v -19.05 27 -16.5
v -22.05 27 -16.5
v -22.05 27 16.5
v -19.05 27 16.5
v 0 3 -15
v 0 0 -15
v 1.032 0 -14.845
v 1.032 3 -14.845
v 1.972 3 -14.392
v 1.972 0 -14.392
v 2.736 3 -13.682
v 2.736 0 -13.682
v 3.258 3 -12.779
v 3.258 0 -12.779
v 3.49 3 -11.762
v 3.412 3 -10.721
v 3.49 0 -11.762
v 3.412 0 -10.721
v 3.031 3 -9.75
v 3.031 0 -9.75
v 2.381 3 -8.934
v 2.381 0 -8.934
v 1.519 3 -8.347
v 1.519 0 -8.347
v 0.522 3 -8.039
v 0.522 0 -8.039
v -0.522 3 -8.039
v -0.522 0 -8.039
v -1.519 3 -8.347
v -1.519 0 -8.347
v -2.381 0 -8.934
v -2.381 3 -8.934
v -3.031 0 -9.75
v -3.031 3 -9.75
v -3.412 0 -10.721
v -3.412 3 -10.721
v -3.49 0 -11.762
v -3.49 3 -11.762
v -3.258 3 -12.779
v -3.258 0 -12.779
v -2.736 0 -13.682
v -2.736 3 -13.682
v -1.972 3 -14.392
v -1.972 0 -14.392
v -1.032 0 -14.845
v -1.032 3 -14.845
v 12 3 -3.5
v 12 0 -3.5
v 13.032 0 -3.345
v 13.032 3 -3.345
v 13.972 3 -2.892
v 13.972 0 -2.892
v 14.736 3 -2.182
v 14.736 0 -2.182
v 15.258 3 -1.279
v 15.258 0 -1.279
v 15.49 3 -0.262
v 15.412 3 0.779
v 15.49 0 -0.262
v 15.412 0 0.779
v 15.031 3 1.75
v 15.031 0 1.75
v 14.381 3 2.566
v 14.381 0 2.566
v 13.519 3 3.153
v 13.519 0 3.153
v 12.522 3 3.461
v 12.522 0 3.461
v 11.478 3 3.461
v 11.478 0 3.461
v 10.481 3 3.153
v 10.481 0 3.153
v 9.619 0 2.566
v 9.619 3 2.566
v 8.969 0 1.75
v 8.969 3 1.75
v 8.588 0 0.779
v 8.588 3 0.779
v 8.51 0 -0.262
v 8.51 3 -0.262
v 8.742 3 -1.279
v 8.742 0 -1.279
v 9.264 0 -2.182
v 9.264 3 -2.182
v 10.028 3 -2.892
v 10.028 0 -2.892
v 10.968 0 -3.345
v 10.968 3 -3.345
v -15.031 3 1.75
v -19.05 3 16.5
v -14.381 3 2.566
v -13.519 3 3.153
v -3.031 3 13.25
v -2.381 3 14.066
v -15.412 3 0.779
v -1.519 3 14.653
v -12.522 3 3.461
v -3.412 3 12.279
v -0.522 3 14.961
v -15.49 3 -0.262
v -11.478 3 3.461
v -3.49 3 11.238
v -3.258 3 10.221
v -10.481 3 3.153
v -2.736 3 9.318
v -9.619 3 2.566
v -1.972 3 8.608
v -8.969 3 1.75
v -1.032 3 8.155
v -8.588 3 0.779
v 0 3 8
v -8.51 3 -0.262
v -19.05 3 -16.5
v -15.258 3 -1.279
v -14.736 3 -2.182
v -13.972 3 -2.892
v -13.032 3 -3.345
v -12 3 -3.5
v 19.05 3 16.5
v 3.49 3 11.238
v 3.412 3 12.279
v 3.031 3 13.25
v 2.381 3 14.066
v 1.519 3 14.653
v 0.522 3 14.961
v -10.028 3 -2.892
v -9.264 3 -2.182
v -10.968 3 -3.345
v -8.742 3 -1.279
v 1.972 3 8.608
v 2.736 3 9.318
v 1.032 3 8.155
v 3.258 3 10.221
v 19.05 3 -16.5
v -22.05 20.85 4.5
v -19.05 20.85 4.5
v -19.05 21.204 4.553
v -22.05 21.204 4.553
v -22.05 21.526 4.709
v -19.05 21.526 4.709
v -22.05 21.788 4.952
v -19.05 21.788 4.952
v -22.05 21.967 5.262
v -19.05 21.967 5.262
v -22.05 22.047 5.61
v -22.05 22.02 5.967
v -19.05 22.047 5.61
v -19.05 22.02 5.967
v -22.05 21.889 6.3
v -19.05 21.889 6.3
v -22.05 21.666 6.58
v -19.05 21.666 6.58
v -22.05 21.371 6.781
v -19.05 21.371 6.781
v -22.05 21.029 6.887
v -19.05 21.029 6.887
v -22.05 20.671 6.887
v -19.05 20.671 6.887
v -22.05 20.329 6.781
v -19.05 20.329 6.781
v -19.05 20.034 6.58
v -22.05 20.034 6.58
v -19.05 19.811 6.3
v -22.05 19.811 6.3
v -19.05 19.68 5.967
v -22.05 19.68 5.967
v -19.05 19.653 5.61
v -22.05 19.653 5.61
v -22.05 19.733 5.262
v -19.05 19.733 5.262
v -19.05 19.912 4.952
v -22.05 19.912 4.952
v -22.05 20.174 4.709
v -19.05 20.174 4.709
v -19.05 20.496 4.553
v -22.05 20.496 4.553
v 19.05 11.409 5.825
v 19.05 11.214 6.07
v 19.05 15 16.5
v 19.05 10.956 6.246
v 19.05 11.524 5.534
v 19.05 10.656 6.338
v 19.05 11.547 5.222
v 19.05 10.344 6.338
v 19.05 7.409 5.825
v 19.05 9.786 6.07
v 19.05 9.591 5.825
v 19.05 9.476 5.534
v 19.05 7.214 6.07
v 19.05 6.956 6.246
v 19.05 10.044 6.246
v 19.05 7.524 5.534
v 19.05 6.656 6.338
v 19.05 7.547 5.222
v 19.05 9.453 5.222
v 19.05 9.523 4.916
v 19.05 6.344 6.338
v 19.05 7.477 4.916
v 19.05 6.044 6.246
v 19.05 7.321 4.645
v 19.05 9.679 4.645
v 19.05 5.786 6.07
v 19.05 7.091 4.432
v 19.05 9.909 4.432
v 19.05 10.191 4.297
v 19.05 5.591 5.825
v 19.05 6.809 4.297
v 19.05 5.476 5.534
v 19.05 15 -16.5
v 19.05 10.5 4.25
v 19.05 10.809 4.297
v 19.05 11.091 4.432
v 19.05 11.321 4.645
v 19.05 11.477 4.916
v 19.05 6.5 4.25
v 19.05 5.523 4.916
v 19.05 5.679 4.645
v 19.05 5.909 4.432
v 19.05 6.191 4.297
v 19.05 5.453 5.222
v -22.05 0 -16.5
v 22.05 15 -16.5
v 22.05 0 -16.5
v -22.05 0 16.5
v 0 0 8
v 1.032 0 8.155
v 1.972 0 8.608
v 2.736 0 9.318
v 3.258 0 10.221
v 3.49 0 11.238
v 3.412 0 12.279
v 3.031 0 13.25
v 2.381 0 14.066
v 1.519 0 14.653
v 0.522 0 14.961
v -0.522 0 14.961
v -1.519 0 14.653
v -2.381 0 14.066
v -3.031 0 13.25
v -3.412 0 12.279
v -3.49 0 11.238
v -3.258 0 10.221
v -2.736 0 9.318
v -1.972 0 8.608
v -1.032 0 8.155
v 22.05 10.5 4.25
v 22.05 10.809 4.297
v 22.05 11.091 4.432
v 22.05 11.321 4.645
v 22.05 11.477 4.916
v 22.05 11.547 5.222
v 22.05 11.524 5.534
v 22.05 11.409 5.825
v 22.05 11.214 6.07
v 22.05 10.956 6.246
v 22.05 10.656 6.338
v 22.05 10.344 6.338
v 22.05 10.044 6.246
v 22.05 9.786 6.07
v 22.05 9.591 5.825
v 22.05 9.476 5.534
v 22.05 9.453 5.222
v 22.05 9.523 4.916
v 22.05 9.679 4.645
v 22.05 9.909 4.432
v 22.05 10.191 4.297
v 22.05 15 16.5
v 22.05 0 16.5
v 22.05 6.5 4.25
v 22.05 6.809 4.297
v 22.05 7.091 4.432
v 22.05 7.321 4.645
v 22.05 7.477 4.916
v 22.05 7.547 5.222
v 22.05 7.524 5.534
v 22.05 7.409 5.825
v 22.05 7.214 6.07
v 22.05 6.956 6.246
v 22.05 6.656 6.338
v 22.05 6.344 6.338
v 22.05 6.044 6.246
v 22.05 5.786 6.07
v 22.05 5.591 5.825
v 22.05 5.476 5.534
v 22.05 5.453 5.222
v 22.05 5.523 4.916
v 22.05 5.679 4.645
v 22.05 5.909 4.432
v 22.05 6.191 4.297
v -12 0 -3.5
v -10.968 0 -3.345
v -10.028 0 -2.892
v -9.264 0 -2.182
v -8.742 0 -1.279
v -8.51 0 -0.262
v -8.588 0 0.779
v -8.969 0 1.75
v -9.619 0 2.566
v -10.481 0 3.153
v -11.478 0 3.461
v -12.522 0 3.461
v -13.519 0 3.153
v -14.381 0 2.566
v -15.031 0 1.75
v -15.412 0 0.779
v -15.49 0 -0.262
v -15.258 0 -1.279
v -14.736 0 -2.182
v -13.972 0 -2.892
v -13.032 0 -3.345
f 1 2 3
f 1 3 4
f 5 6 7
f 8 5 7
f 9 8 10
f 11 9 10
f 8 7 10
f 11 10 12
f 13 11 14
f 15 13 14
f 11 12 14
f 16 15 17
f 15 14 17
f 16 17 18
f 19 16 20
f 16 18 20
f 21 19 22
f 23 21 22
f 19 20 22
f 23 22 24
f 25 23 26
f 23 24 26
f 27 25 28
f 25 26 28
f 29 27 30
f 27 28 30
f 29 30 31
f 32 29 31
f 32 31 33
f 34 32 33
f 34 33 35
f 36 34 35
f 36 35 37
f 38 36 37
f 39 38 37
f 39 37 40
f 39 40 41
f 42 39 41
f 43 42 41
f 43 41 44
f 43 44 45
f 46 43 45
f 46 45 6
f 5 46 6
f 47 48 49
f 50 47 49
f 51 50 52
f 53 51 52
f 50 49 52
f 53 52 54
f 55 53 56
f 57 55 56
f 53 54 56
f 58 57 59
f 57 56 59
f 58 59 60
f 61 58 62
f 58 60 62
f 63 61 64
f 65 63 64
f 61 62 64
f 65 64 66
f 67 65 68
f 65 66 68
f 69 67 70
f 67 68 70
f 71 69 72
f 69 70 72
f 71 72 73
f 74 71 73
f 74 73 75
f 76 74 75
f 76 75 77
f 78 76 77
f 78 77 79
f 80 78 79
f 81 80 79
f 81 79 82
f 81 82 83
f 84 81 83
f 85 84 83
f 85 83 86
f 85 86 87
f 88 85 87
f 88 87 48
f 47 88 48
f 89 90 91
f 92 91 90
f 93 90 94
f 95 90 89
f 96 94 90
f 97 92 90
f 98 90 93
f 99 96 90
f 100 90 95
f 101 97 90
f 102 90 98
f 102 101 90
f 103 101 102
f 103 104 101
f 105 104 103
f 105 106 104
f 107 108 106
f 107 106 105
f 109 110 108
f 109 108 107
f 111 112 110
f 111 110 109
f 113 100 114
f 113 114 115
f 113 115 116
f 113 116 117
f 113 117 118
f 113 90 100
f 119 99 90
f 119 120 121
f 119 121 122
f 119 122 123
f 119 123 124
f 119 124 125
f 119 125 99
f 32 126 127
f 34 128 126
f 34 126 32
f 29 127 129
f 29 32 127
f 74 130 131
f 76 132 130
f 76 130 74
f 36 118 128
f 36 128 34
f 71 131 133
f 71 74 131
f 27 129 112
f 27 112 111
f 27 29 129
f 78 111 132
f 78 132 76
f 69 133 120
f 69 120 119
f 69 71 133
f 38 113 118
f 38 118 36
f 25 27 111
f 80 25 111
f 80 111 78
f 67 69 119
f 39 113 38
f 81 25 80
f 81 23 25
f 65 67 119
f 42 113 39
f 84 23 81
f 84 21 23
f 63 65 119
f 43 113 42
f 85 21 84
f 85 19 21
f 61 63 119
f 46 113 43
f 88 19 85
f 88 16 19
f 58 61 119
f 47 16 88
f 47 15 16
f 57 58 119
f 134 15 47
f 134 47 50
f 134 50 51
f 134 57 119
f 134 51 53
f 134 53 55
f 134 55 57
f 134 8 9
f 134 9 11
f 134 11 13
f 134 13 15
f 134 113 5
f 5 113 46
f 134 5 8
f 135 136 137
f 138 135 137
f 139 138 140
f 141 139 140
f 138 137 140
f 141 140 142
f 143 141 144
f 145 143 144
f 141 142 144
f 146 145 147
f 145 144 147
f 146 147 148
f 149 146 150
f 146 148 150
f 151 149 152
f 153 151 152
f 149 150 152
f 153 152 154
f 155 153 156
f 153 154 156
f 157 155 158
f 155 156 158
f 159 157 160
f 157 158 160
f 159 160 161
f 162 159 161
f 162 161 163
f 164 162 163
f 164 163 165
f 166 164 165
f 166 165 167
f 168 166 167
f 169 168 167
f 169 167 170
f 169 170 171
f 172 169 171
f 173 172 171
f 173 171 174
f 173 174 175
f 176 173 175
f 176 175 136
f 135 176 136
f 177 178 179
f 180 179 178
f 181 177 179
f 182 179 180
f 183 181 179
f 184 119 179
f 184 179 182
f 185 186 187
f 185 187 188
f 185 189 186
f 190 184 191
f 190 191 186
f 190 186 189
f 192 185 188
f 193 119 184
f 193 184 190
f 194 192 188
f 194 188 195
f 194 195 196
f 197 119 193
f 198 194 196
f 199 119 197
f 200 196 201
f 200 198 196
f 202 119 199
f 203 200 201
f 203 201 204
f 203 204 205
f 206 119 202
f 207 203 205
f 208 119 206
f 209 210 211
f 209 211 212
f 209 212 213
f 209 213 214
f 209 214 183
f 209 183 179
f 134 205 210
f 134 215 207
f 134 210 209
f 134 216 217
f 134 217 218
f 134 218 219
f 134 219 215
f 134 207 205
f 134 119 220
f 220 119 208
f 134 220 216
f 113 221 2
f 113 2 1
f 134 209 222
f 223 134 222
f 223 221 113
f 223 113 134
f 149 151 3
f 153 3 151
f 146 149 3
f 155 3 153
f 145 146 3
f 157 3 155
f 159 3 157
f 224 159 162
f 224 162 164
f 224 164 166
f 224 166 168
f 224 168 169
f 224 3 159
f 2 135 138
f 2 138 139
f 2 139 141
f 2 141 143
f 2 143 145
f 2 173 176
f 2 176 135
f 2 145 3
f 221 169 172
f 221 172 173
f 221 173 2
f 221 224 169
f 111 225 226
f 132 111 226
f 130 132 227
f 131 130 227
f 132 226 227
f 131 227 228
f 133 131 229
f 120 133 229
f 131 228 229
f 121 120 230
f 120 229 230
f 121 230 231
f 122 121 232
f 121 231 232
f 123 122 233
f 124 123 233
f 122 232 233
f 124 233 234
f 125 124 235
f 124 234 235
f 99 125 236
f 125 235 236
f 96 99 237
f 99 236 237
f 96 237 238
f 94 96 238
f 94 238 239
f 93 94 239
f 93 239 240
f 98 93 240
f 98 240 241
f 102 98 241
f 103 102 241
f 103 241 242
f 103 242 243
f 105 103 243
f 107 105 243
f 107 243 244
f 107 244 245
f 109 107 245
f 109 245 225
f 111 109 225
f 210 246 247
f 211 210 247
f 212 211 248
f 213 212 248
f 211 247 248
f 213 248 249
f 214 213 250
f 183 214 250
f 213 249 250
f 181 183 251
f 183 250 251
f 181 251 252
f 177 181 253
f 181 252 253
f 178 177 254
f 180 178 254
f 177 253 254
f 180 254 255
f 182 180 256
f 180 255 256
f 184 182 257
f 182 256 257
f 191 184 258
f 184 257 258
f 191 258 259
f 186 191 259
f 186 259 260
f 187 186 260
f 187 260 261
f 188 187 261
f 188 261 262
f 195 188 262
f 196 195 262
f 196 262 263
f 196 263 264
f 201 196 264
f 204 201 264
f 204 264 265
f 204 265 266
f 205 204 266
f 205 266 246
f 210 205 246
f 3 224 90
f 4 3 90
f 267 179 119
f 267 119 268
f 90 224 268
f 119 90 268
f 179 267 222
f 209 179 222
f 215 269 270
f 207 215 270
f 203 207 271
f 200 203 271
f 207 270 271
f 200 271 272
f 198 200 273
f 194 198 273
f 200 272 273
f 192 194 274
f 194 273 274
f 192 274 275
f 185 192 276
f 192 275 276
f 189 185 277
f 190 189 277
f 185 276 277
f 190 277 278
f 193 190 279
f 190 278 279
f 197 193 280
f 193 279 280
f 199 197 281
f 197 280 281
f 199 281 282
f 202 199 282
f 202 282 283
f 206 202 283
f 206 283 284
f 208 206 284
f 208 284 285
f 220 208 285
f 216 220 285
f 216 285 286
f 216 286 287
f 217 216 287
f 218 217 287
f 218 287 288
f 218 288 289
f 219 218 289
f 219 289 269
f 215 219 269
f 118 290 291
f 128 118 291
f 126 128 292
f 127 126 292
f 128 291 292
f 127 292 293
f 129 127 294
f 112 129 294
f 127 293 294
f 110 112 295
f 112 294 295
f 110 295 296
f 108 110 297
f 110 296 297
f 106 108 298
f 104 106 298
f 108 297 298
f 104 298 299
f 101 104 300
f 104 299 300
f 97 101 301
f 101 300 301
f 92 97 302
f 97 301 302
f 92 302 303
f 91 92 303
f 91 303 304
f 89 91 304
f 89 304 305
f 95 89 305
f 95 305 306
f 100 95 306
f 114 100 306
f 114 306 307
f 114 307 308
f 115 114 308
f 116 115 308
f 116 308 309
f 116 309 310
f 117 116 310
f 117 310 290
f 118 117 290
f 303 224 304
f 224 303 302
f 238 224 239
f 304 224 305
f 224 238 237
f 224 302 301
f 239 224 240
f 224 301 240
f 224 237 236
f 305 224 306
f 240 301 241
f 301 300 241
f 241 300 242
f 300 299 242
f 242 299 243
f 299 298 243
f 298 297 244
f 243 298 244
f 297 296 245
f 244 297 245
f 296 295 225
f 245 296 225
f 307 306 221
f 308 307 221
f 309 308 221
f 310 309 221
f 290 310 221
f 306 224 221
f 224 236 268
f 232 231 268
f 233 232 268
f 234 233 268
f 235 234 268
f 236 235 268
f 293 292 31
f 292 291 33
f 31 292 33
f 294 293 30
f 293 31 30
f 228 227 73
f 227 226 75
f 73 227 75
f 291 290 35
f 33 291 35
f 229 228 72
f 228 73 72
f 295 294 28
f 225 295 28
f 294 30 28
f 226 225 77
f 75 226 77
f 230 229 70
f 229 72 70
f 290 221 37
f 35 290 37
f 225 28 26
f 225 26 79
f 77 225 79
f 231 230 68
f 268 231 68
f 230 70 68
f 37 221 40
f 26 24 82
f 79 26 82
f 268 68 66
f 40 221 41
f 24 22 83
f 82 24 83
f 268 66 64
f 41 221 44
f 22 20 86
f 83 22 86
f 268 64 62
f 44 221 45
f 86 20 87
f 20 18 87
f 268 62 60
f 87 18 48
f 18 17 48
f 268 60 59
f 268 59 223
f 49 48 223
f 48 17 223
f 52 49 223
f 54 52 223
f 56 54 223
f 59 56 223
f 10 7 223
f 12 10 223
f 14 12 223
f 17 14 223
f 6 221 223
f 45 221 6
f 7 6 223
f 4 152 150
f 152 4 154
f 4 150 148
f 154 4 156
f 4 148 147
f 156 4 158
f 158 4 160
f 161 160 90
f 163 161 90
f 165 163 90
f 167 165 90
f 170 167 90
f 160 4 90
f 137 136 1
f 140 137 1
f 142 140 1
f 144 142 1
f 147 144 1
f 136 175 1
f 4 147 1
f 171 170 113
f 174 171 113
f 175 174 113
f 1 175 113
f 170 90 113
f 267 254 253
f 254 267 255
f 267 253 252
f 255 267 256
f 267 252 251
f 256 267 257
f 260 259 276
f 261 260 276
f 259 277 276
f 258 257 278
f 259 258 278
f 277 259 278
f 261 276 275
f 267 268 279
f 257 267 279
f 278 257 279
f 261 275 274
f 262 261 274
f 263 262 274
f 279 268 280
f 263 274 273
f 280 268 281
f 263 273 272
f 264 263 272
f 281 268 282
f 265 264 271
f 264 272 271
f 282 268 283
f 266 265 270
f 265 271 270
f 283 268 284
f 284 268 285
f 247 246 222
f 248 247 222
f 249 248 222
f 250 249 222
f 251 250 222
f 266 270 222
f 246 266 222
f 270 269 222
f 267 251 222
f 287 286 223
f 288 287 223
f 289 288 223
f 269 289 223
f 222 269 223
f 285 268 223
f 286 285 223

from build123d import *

# Parameters (mm, degrees)
SKIZZE1_W                       = 44.1
SKIZZE1_H                       = 33
AUFSATZ_LINEAR_AUSTRAGEN1_DEPTH = 3
SKIZZE2_W                       = 3
SKIZZE2_H                       = 33
AUFSATZ_LINEAR_AUSTRAGEN2_DEPTH = 24
SKIZZE3_W                       = 33
SKIZZE3_H                       = 12
SCHNITT_LINEAR_AUSTRAGEN1_DEPTH = 24
SKIZZE4_R                       = 1.2
SCHNITT_LINEAR_AUSTRAGEN2_DEPTH = 10
SKIZZE5_R                       = 1.05
SCHNITT_LINEAR_AUSTRAGEN3_DEPTH = 10
SKIZZE6_R                       = 3.5
SCHNITT_LINEAR_AUSTRAGEN4_DEPTH = 10


with BuildPart() as part:
    # Skizze1 → Aufsatz-Linear austragen1 (new body)
    with BuildSketch(Plane(origin=(0, 0, 0), x_dir=(1, 0, 0), z_dir=(0, 1, 0))):
        Rectangle(SKIZZE1_W, SKIZZE1_H)
    extrude(amount=AUFSATZ_LINEAR_AUSTRAGEN1_DEPTH)

    # Skizze2 → Aufsatz-Linear austragen2 (add)
    with BuildSketch(Plane(origin=(0, 3, 0), x_dir=(1, 0, 0), z_dir=(0, 1, 0))):
        with Locations((-20.55, 0)):
            Rectangle(SKIZZE2_W, SKIZZE2_H)
        with Locations((20.55, 0)):
            Rectangle(SKIZZE2_W, SKIZZE2_H)
    extrude(amount=AUFSATZ_LINEAR_AUSTRAGEN2_DEPTH)

    # Skizze3 → Schnitt-Linear austragen1 (cut)
    with BuildSketch(Plane(origin=(22.05, 0, 0), x_dir=(0, 0, -1), z_dir=(1, 0, 0))):
        with Locations((0, 21)):
            Rectangle(SKIZZE3_W, SKIZZE3_H)
    extrude(amount=-SCHNITT_LINEAR_AUSTRAGEN1_DEPTH, mode=Mode.SUBTRACT)

    # Skizze4 → Schnitt-Linear austragen2 (cut)
    with BuildSketch(Plane(origin=(-19.05, 0, 0), x_dir=(0, 0, -1), z_dir=(1, 0, 0))):
        with Locations((-5.7, 20.85)):
            Circle(SKIZZE4_R)
    extrude(amount=-SCHNITT_LINEAR_AUSTRAGEN2_DEPTH, mode=Mode.SUBTRACT)

    # Skizze5 → Schnitt-Linear austragen3 (cut)
    with BuildSketch(Plane(origin=(22.05, 0, 0), x_dir=(0, 0, -1), z_dir=(1, 0, 0))):
        with Locations((-5.3, 10.5)):
            Circle(SKIZZE5_R)
        with Locations((-5.3, 6.5)):
            Circle(SKIZZE5_R)
    extrude(amount=-SCHNITT_LINEAR_AUSTRAGEN3_DEPTH, mode=Mode.SUBTRACT)

    # Skizze6 → Schnitt-Linear austragen4 (cut)
    with BuildSketch(Plane.XZ):
        with Locations(Location((-12, 0, 0), (0, 0, 270))):
            Circle(SKIZZE6_R)
        with Locations(Location((0, -11.5, 0), (0, 0, 270))):
            Circle(SKIZZE6_R)
        with Locations(Location((12, 0, 0), (0, 0, 270))):
            Circle(SKIZZE6_R)
        with Locations(Location((0, 11.5, 0), (0, 0, 270))):
            Circle(SKIZZE6_R)
    extrude(amount=-SCHNITT_LINEAR_AUSTRAGEN4_DEPTH, mode=Mode.SUBTRACT)


solid = part.part
